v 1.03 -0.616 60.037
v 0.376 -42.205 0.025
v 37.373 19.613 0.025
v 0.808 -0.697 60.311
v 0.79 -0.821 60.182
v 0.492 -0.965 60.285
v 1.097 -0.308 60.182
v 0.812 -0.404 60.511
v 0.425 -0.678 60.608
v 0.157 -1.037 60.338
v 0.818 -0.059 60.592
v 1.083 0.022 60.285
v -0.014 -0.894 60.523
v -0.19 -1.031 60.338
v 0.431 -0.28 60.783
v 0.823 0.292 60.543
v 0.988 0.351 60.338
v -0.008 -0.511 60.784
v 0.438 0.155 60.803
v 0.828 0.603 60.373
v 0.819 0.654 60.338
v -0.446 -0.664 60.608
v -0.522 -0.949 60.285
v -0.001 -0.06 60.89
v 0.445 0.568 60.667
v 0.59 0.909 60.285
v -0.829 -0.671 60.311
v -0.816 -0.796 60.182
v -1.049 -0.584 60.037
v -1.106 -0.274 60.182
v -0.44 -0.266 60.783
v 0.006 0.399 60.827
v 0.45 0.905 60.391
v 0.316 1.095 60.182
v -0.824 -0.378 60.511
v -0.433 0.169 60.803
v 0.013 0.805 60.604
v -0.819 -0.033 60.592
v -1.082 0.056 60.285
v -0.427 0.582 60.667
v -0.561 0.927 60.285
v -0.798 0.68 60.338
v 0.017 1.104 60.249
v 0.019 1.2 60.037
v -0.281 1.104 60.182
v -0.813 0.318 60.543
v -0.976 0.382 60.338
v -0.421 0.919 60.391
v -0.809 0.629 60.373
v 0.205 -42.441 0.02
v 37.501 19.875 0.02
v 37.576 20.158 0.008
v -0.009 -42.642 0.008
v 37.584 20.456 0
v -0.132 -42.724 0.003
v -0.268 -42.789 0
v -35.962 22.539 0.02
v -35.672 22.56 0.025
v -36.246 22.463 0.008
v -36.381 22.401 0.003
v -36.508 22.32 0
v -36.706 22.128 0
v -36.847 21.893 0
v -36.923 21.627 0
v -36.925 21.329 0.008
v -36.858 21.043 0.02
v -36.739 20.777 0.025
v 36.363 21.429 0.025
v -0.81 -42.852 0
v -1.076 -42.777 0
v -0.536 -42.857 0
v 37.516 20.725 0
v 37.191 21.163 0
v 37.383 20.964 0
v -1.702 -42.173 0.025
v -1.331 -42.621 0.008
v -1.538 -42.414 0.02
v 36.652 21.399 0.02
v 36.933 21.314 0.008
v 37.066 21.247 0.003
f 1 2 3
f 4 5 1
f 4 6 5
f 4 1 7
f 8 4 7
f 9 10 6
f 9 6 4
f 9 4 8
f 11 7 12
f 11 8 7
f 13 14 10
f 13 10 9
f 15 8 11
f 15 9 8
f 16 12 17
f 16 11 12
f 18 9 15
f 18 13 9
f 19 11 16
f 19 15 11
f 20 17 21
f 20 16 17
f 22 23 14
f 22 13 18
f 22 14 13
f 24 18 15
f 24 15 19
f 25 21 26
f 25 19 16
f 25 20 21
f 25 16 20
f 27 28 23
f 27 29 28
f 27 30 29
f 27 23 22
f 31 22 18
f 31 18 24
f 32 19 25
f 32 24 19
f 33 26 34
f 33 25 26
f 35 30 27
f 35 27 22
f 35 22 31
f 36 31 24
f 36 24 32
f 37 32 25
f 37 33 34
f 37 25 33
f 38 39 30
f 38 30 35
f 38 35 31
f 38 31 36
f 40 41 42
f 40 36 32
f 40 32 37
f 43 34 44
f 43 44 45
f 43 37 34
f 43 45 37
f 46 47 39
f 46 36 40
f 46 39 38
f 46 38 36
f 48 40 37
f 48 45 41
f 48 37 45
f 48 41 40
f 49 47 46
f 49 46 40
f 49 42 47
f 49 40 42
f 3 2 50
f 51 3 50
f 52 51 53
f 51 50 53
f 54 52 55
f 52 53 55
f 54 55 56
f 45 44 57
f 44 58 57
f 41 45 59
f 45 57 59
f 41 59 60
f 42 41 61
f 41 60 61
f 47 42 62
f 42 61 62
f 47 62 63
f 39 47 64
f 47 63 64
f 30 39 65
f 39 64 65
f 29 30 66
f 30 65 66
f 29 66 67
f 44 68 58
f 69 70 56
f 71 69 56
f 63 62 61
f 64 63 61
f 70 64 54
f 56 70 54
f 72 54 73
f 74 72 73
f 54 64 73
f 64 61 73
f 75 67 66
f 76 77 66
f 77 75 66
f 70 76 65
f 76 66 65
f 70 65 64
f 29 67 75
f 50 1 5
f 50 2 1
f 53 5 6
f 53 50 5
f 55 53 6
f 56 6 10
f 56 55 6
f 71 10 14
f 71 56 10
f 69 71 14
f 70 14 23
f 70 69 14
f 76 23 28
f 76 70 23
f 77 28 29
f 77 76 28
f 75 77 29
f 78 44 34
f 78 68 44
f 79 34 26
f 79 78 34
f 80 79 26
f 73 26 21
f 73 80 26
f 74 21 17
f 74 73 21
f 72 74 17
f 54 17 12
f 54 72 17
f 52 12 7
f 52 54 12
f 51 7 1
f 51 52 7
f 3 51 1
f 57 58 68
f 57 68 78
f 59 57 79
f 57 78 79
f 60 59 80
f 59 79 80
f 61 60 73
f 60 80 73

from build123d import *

# Parameters (mm, degrees)
F1_DEPTH     = 0.0254
F5_T1_DEPTH  = 77.4636340451
F5_T3_DEPTH  = 77.4636340451
F5_T5_DEPTH  = 77.4636340451
F5_T7_DEPTH  = 81.7261129419
F5_T9_DEPTH  = 81.7261129419
F5_T11_DEPTH = 81.7261129419
F5_T16_DEPTH = 4.7473188038


# Not quite as in the source:
# - a fillet or chamfer that OpenCascade refuses, or shapes differently, is made with other operations: its cross-section is extruded or revolved along the edge and cut away or added


with BuildPart() as f1:
    # F0 (on Top) → F1 (new body)
    with BuildSketch(Plane.XY):
        Polygon((-37.7498417943, 22.5926856417), (-0.6909188082, -43.9886648036), (38.4407606026, 21.3959791619), align=None)
    extrude(amount=F1_DEPTH)

    # F1_face (on face) → F4 section 0
    with BuildSketch(Plane.XY.offset(0.0254), mode=Mode.PRIVATE) as f4_s0:
        Polygon((38.4407606026, 21.3959791619), (-37.7498417943, 22.5926856417), (-0.6909188082, -43.9886648036), align=None)
    loft([f4_s0.sketch, Vertex(0, 0, 63.5)])

    # F5: fillet of radius 1.27 on 6 edges, made by hand

    # F5_s2 → F5_t1 (cut)
    with BuildSketch(Plane(origin=(-18.8367378497, 33.8427386163, 0), x_dir=(0, 0, 1), z_dir=(0.486337572, -0.8737710032, 0))):
        with BuildLine():
            ThreePointArc((0.0254, 21.9970452561), (0.0063659549, 21.8713184471), (0, 21.7443184471))
            Line((0, 21.7443184471), (0, 21.9970452561))
            Line((0, 21.9970452561), (0.0254, 21.9970452561))
        make_face()
    extrude(amount=F5_T1_DEPTH, mode=Mode.SUBTRACT)

    # F5_s4 → F5_t3 (cut)
    with BuildSketch(Plane(origin=(-19.8903024505, -33.2344628104, 0), x_dir=(0, 0, 1), z_dir=(0.5135390999, 0.8580661938, 0))):
        with BuildLine():
            ThreePointArc((0.0254, 21.9970452561), (0.0063659549, 21.8713184471), (0, 21.7443184471))
            Line((0, 21.7443184471), (0, 21.9970452561))
            Line((0, 21.9970452561), (0.0254, 21.9970452561))
        make_face()
    extrude(amount=F5_T3_DEPTH, mode=Mode.SUBTRACT)

    # F5_s6 → F5_t5 (cut)
    with BuildSketch(Plane(origin=(38.7270403002, -0.6082758058, 0), x_dir=(0, 0, 1), z_dir=(-0.9998766719, 0.0157048094, 0))):
        with BuildLine():
            ThreePointArc((0.0254, 21.9970452561), (0.0063659549, 21.8713184471), (0, 21.7443184471))
            Line((0, 21.7443184471), (0, 21.9970452561))
            Line((0, 21.9970452561), (0.0254, 21.9970452561))
        make_face()
    extrude(amount=F5_T5_DEPTH, mode=Mode.SUBTRACT)

    # F5_s8 → F5_t7 (cut)
    with BuildSketch(Plane(origin=(-15.9953348191, 9.5729559152, -26.8954101859), x_dir=(0.5135390999, 0.8580661938, 0), z_dir=(0.4887963318, -0.2925369046, 0.8218882561))):
        with BuildLine():
            ThreePointArc((1.0392181385, 34.6933141222), (0, 35.2332965467), (-1.0392181385, 34.6933141222))
            Line((-1.0392181385, 34.6933141222), (0, 36.172695408))
            Line((0, 36.172695408), (1.0392181385, 34.6933141222))
        make_face()
    extrude(amount=F5_T7_DEPTH, mode=Mode.SUBTRACT)

    # F5_s10 → F5_t9 (cut)
    with BuildSketch(Plane(origin=(16.2880904214, 9.0658883378, -26.8954101859), x_dir=(0.486337572, -0.8737710032, 0), z_dir=(-0.4977425568, -0.2770415883, 0.8218882561))):
        with BuildLine():
            ThreePointArc((-1.0392181385, 34.6933141222), (0, 35.2332965467), (1.0392181385, 34.6933141222))
            Line((1.0392181385, 34.6933141222), (0, 36.172695408))
            Line((0, 36.172695408), (-1.0392181385, 34.6933141222))
        make_face()
    extrude(amount=F5_T9_DEPTH, mode=Mode.SUBTRACT)

    # F5_s12 → F5_t11 (cut)
    with BuildSketch(Plane(origin=(-0.2927556023, -18.638844253, -26.8954101859), x_dir=(-0.9998766719, 0.0157048094, 0), z_dir=(0.008946225, 0.5695784929, 0.8218882561))):
        with BuildLine():
            ThreePointArc((-1.0392181385, 34.6933141222), (0, 35.2332965467), (1.0392181385, 34.6933141222))
            Line((1.0392181385, 34.6933141222), (0, 36.172695408))
            Line((0, 36.172695408), (-1.0392181385, 34.6933141222))
        make_face()
    extrude(amount=F5_T11_DEPTH, mode=Mode.SUBTRACT)


with BuildPart() as f5_tool14:
    # F5_s15 → F5_t16 (new body)
    with BuildSketch(Plane.XY.offset(59.6214715655)):
        Polygon((4.8212890631, 4.6721775887), (-4.6721775887, 4.8212890631), (-4.8212890631, -4.6721775887), (4.6721775887, -4.8212890631), align=None)
    extrude(amount=F5_T16_DEPTH)

    split(bisect_by=Plane(origin=(-24.3904739903, -13.5756437975, 40.2743222578), x_dir=(0.486337572, -0.8737710032, 0), z_dir=(-0.4977425568, -0.2770415883, 0.8218882561)), keep=Keep.TOP)

    split(bisect_by=Plane(origin=(0.4383845938, 27.9105919847, 40.2743222578), x_dir=(-0.9998766719, 0.0157048094, 0), z_dir=(0.008946225, 0.5695784929, 0.8218882561)), keep=Keep.TOP)

    split(bisect_by=Plane(origin=(23.9520893965, -14.3349481872, 40.2743222578), x_dir=(0.5135390999, 0.8580661938, 0), z_dir=(0.4887963318, -0.2925369046, 0.8218882561)), keep=Keep.TOP)

    split(bisect_by=Plane(origin=(0.3089197728, 19.6679670247, 6.8167506947), x_dir=(0.9998766719, -0.0157048094, 0), z_dir=(-0.0148390137, -0.9447541355, -0.3274437771)), keep=Keep.TOP)

    split(bisect_by=Plane(origin=(16.8784991978, -10.1015158833, 6.8167506947), x_dir=(-0.5135390999, -0.8580661938, 0), z_dir=(-0.8107615748, 0.4852280306, -0.3274437771)), keep=Keep.TOP)

    split(bisect_by=Plane(origin=(-17.1874189706, -9.5664511414, 6.8167506947), x_dir=(-0.486337572, 0.8737710032, 0), z_dir=(0.8256005885, 0.4595261049, -0.3274437771)), keep=Keep.TOP)

    # F5_s23 → F5_t24 (revolve, cut)
    with BuildSketch(Plane(origin=(0, 0, 59.6214715655), x_dir=(0, 0, -1), z_dir=(0.0157048094, 0.9998766719, 0))):
        with BuildLine():
            ThreePointArc((0, -1.27), (1.27, 0), (0, 1.27))
            Line((0, 1.27), (0, -1.27))
        make_face()
    revolve(axis=Axis((0, 0, 59.6214715655), (-0.9998766719, 0.0157048094, 0)), mode=Mode.SUBTRACT)


with BuildPart() as f1_1:
    add(f1.part)

    # F5_t13: cut F5_tool14
    add(f5_tool14.part, mode=Mode.SUBTRACT)


solid = f1_1.part
